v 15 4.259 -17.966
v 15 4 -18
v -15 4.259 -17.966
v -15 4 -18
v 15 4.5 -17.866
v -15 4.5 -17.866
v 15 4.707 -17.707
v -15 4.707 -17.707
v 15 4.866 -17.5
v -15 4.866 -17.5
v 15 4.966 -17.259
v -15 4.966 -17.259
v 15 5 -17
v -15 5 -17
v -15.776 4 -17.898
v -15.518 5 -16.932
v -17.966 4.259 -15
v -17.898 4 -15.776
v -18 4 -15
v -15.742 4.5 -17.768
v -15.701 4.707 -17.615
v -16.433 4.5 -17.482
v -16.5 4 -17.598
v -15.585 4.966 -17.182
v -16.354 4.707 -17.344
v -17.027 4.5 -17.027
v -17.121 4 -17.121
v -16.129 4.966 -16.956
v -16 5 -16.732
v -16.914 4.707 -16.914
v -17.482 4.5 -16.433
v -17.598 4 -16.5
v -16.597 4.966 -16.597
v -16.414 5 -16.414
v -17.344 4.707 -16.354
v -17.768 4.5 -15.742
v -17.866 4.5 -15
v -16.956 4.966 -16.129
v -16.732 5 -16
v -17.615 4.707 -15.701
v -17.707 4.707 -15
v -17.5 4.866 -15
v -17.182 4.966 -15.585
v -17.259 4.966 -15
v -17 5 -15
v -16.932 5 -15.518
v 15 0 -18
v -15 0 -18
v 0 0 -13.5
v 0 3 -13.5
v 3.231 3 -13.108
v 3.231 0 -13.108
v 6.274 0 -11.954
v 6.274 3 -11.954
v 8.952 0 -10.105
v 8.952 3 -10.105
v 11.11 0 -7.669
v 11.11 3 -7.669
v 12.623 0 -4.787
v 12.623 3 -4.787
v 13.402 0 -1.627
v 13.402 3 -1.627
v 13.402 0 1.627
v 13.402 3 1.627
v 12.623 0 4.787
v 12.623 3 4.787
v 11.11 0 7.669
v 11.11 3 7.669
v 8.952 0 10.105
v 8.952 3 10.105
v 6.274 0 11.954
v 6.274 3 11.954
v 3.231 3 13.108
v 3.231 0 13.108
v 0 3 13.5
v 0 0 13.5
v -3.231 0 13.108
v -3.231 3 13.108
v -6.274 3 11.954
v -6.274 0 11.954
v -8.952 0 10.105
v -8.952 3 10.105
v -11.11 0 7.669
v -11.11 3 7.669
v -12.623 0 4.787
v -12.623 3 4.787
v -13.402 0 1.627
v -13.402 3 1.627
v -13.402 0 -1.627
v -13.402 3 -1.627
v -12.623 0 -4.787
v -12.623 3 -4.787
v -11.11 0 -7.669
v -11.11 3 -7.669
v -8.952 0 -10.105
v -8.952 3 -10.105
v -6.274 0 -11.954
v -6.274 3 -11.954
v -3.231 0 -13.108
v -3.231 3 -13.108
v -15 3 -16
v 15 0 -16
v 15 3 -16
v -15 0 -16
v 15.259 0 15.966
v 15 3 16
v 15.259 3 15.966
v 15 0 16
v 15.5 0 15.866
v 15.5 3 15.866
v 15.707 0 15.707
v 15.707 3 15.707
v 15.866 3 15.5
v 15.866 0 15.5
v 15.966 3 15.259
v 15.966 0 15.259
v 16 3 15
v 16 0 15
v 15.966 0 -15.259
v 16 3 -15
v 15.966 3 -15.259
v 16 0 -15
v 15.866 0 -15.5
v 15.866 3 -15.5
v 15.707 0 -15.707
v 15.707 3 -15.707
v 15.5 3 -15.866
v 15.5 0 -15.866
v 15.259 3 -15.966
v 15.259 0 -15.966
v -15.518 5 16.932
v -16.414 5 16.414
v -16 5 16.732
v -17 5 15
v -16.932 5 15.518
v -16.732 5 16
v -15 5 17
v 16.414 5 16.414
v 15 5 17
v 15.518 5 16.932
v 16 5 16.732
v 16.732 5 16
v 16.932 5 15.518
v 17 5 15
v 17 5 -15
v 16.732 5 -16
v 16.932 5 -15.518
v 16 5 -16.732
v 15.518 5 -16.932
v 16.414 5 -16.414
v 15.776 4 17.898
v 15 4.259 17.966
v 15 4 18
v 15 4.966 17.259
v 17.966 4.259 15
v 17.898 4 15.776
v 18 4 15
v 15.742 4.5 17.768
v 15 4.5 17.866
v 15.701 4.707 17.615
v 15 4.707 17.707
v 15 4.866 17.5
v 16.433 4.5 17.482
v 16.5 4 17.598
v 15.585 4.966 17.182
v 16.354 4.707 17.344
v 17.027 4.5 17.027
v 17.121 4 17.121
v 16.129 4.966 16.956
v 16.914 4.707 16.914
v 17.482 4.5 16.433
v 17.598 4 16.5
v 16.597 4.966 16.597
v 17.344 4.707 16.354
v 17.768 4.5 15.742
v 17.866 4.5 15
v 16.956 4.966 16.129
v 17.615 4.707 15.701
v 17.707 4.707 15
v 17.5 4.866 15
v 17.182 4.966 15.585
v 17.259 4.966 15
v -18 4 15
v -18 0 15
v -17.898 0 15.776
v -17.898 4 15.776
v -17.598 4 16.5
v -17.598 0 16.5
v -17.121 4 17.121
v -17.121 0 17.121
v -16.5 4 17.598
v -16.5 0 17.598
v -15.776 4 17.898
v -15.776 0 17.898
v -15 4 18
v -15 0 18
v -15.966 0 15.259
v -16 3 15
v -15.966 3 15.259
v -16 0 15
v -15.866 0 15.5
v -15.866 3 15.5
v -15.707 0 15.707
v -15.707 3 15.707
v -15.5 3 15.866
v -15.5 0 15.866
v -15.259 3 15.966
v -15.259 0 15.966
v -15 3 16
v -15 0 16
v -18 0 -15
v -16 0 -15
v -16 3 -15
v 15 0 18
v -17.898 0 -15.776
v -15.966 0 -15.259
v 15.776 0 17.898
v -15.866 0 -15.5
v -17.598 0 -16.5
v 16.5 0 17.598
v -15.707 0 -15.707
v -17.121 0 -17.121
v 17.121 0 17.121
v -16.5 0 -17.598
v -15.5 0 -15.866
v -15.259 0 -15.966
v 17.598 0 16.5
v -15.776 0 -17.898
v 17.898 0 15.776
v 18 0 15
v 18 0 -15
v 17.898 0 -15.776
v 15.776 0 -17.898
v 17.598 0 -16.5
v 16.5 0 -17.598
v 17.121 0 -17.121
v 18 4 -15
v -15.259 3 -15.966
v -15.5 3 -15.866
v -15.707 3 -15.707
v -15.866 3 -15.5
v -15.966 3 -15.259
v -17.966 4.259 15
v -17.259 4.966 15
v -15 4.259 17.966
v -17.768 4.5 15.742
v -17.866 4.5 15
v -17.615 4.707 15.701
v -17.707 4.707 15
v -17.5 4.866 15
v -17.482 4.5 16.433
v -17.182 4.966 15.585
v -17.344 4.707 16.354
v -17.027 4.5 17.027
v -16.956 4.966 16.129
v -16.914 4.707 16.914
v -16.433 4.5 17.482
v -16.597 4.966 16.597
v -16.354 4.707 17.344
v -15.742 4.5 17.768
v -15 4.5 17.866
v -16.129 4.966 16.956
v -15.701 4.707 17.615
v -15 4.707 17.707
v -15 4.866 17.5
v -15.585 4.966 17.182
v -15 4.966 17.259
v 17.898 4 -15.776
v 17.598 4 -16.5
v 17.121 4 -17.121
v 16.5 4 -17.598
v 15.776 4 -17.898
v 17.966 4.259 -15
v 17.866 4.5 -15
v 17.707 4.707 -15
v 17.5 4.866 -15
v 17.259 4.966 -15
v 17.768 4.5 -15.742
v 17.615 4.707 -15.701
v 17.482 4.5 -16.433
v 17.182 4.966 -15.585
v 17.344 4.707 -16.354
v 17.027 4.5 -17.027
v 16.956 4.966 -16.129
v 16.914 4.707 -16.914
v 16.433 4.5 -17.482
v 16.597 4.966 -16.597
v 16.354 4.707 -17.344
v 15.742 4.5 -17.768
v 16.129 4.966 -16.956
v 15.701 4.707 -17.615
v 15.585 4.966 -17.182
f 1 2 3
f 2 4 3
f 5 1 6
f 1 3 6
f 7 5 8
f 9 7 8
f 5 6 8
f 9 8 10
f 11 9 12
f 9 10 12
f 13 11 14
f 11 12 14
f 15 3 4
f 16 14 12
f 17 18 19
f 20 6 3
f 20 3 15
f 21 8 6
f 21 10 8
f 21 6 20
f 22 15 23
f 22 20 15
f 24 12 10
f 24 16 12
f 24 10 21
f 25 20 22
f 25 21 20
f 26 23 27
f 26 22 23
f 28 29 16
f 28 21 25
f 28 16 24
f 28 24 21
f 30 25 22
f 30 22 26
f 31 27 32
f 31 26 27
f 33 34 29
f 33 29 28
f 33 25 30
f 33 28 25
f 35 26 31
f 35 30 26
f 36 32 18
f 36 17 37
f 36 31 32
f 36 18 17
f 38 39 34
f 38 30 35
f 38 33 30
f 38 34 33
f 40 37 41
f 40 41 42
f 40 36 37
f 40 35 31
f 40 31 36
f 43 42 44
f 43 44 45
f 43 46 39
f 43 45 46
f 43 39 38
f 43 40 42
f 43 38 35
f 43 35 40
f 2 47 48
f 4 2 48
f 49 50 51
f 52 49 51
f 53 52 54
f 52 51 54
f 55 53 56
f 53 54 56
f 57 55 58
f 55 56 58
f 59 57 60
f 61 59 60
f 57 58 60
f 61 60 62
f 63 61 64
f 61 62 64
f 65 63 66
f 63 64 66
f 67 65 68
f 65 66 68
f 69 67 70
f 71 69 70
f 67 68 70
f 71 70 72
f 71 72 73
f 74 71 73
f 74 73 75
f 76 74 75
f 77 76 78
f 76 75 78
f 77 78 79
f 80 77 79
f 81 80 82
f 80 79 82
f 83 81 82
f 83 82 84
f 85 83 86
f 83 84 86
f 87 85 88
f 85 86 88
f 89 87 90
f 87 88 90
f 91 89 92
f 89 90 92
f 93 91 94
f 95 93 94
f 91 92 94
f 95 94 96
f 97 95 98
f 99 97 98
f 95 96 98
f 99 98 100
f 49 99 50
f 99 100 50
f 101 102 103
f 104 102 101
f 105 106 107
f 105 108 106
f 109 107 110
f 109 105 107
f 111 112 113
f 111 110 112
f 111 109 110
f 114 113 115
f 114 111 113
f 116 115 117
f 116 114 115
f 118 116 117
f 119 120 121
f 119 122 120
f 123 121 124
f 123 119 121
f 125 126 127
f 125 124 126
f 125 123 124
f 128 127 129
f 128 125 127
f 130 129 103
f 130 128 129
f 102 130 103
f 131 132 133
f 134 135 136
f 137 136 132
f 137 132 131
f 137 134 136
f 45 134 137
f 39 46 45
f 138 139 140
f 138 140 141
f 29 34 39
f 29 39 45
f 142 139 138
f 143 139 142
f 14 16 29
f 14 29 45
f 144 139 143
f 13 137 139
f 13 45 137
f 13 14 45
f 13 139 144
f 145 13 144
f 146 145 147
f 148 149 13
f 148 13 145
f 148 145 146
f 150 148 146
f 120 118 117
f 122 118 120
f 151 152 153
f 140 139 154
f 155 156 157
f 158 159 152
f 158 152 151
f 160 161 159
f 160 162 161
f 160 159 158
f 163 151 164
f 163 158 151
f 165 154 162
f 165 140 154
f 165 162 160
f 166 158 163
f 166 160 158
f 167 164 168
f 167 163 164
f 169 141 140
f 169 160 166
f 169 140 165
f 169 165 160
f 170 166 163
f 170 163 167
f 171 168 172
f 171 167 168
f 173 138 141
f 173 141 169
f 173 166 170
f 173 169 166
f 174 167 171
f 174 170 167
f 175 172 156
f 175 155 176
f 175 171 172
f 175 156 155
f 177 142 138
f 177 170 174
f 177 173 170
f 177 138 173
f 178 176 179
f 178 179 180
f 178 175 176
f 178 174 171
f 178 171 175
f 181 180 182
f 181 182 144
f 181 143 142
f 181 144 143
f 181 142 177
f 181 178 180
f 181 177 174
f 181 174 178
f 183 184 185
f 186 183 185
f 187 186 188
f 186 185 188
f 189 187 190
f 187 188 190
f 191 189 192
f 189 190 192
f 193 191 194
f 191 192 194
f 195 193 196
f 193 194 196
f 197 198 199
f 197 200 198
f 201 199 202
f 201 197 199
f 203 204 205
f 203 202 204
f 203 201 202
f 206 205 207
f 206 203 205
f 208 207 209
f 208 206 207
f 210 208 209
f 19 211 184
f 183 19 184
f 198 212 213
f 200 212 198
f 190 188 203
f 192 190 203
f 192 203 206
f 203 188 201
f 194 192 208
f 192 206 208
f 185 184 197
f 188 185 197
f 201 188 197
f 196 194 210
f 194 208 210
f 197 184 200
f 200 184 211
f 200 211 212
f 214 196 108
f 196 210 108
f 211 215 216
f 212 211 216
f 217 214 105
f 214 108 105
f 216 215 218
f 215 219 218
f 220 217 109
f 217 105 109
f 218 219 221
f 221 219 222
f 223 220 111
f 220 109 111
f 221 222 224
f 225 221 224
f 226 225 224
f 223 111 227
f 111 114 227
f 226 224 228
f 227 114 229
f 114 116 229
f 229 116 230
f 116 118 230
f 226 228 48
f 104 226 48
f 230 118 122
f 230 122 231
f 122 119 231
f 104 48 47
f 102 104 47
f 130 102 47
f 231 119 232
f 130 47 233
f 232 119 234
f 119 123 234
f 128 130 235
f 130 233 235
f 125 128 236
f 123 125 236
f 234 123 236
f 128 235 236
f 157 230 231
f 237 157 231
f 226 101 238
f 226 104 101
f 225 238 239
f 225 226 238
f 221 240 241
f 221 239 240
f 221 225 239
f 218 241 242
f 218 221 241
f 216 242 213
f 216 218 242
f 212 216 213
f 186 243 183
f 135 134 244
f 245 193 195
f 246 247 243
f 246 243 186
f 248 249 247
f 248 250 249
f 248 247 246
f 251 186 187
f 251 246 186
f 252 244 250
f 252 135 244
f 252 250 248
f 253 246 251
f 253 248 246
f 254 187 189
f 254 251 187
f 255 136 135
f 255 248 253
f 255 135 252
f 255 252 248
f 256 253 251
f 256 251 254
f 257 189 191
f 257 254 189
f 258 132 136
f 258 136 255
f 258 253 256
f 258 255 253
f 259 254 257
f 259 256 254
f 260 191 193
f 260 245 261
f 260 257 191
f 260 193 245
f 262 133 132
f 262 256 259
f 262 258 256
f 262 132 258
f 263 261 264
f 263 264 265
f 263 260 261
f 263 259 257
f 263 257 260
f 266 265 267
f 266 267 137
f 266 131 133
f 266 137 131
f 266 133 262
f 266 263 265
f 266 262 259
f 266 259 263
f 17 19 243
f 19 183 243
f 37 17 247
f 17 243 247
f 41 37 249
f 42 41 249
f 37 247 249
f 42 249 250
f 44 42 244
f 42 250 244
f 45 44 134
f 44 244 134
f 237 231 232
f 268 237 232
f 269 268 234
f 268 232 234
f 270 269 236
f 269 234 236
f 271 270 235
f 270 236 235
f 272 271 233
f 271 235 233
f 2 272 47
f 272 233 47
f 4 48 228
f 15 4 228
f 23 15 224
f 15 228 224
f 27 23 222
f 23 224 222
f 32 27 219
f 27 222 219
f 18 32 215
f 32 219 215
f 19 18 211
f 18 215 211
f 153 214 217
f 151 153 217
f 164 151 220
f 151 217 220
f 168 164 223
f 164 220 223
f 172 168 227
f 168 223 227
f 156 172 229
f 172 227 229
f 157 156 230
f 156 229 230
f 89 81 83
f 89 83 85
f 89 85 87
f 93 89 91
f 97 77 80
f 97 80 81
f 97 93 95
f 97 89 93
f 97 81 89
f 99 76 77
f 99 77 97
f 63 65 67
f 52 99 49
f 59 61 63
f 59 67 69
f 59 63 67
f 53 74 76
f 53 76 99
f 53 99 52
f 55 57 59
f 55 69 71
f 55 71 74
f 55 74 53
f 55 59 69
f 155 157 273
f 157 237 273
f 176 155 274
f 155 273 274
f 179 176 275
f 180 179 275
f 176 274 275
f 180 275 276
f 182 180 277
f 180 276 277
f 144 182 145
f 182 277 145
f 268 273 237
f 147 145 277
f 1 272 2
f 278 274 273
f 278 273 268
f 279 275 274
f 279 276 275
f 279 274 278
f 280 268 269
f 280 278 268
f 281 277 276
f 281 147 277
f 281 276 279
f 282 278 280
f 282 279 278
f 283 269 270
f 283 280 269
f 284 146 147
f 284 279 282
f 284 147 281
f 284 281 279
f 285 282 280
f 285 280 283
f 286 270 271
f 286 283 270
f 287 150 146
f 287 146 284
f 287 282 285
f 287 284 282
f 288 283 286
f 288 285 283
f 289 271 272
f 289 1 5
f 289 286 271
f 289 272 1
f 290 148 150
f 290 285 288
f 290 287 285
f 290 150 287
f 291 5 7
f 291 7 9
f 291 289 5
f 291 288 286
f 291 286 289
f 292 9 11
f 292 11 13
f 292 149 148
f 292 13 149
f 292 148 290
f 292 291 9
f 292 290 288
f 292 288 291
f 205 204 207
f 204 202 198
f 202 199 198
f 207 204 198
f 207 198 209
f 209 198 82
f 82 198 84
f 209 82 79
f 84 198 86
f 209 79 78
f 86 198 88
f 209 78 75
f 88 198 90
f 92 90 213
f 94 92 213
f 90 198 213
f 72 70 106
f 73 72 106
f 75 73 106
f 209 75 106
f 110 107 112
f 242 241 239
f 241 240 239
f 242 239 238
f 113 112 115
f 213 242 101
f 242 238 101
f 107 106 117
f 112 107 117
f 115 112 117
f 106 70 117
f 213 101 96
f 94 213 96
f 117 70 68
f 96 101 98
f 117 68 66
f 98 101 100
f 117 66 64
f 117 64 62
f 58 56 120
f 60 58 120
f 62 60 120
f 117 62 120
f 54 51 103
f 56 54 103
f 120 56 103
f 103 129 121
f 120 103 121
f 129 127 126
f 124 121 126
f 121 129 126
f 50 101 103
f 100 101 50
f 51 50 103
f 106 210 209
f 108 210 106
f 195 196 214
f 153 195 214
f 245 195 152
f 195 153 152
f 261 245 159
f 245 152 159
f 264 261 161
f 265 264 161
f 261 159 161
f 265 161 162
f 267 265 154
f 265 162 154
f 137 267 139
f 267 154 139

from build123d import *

# Parameters (mm, degrees)
BOSS_EXTRUDE1_DEPTH = 5
SHELL1_T            = -2
FILLET1_R           = 1
SKETCH2_R           = 13.5
BOSS_EXTRUDE2_DEPTH = 3


with BuildPart() as part:
    # Sketch1 → Boss-Extrude1 (new body)
    with BuildSketch(Plane(origin=(0, 0, 0), x_dir=(1, 0, 0), z_dir=(0, 1, 0))):
        with BuildLine():
            Line((-15, -18), (15, -18))
            ThreePointArc((15, -18), (17.121320344, -17.121320344), (18, -15))
            Line((18, -15), (18, 15))
            ThreePointArc((18, 15), (17.121320344, 17.121320344), (15, 18))
            Line((15, 18), (-15, 18))
            ThreePointArc((-15, 18), (-17.121320344, 17.121320344), (-18, 15))
            Line((-18, 15), (-18, -15))
            ThreePointArc((-18, -15), (-17.121320344, -17.121320344), (-15, -18))
        make_face()
    extrude(amount=BOSS_EXTRUDE1_DEPTH)

    # Shell1
    shell1_openings = [part.faces().sort_by_distance(p)[0] for p in [
        (0, 0, 0),
    ]]
    offset(amount=SHELL1_T, openings=shell1_openings, kind=Kind.INTERSECTION)

    # Fillet1
    fillet1_edges = [part.edges().sort_by_distance(p)[0] for p in [
        (17.121320344, 5, 17.121320344),
        (18, 5, 0),
        (17.121320344, 5, -17.121320344),
        (0, 5, -18),
        (-17.121320344, 5, -17.121320344),
        (-18, 5, 0),
        (-17.121320344, 5, 17.121320344),
        (0, 5, 18),
    ]]
    fillet(fillet1_edges, radius=FILLET1_R)

    # Sketch2 → Boss-Extrude2 (add)
    with BuildSketch(Plane.XZ.offset(-3)):
        with Locations(Location((0, 0, 0), (0, 0, 270))):
            Circle(SKETCH2_R)
    extrude(amount=BOSS_EXTRUDE2_DEPTH)


solid = part.part
